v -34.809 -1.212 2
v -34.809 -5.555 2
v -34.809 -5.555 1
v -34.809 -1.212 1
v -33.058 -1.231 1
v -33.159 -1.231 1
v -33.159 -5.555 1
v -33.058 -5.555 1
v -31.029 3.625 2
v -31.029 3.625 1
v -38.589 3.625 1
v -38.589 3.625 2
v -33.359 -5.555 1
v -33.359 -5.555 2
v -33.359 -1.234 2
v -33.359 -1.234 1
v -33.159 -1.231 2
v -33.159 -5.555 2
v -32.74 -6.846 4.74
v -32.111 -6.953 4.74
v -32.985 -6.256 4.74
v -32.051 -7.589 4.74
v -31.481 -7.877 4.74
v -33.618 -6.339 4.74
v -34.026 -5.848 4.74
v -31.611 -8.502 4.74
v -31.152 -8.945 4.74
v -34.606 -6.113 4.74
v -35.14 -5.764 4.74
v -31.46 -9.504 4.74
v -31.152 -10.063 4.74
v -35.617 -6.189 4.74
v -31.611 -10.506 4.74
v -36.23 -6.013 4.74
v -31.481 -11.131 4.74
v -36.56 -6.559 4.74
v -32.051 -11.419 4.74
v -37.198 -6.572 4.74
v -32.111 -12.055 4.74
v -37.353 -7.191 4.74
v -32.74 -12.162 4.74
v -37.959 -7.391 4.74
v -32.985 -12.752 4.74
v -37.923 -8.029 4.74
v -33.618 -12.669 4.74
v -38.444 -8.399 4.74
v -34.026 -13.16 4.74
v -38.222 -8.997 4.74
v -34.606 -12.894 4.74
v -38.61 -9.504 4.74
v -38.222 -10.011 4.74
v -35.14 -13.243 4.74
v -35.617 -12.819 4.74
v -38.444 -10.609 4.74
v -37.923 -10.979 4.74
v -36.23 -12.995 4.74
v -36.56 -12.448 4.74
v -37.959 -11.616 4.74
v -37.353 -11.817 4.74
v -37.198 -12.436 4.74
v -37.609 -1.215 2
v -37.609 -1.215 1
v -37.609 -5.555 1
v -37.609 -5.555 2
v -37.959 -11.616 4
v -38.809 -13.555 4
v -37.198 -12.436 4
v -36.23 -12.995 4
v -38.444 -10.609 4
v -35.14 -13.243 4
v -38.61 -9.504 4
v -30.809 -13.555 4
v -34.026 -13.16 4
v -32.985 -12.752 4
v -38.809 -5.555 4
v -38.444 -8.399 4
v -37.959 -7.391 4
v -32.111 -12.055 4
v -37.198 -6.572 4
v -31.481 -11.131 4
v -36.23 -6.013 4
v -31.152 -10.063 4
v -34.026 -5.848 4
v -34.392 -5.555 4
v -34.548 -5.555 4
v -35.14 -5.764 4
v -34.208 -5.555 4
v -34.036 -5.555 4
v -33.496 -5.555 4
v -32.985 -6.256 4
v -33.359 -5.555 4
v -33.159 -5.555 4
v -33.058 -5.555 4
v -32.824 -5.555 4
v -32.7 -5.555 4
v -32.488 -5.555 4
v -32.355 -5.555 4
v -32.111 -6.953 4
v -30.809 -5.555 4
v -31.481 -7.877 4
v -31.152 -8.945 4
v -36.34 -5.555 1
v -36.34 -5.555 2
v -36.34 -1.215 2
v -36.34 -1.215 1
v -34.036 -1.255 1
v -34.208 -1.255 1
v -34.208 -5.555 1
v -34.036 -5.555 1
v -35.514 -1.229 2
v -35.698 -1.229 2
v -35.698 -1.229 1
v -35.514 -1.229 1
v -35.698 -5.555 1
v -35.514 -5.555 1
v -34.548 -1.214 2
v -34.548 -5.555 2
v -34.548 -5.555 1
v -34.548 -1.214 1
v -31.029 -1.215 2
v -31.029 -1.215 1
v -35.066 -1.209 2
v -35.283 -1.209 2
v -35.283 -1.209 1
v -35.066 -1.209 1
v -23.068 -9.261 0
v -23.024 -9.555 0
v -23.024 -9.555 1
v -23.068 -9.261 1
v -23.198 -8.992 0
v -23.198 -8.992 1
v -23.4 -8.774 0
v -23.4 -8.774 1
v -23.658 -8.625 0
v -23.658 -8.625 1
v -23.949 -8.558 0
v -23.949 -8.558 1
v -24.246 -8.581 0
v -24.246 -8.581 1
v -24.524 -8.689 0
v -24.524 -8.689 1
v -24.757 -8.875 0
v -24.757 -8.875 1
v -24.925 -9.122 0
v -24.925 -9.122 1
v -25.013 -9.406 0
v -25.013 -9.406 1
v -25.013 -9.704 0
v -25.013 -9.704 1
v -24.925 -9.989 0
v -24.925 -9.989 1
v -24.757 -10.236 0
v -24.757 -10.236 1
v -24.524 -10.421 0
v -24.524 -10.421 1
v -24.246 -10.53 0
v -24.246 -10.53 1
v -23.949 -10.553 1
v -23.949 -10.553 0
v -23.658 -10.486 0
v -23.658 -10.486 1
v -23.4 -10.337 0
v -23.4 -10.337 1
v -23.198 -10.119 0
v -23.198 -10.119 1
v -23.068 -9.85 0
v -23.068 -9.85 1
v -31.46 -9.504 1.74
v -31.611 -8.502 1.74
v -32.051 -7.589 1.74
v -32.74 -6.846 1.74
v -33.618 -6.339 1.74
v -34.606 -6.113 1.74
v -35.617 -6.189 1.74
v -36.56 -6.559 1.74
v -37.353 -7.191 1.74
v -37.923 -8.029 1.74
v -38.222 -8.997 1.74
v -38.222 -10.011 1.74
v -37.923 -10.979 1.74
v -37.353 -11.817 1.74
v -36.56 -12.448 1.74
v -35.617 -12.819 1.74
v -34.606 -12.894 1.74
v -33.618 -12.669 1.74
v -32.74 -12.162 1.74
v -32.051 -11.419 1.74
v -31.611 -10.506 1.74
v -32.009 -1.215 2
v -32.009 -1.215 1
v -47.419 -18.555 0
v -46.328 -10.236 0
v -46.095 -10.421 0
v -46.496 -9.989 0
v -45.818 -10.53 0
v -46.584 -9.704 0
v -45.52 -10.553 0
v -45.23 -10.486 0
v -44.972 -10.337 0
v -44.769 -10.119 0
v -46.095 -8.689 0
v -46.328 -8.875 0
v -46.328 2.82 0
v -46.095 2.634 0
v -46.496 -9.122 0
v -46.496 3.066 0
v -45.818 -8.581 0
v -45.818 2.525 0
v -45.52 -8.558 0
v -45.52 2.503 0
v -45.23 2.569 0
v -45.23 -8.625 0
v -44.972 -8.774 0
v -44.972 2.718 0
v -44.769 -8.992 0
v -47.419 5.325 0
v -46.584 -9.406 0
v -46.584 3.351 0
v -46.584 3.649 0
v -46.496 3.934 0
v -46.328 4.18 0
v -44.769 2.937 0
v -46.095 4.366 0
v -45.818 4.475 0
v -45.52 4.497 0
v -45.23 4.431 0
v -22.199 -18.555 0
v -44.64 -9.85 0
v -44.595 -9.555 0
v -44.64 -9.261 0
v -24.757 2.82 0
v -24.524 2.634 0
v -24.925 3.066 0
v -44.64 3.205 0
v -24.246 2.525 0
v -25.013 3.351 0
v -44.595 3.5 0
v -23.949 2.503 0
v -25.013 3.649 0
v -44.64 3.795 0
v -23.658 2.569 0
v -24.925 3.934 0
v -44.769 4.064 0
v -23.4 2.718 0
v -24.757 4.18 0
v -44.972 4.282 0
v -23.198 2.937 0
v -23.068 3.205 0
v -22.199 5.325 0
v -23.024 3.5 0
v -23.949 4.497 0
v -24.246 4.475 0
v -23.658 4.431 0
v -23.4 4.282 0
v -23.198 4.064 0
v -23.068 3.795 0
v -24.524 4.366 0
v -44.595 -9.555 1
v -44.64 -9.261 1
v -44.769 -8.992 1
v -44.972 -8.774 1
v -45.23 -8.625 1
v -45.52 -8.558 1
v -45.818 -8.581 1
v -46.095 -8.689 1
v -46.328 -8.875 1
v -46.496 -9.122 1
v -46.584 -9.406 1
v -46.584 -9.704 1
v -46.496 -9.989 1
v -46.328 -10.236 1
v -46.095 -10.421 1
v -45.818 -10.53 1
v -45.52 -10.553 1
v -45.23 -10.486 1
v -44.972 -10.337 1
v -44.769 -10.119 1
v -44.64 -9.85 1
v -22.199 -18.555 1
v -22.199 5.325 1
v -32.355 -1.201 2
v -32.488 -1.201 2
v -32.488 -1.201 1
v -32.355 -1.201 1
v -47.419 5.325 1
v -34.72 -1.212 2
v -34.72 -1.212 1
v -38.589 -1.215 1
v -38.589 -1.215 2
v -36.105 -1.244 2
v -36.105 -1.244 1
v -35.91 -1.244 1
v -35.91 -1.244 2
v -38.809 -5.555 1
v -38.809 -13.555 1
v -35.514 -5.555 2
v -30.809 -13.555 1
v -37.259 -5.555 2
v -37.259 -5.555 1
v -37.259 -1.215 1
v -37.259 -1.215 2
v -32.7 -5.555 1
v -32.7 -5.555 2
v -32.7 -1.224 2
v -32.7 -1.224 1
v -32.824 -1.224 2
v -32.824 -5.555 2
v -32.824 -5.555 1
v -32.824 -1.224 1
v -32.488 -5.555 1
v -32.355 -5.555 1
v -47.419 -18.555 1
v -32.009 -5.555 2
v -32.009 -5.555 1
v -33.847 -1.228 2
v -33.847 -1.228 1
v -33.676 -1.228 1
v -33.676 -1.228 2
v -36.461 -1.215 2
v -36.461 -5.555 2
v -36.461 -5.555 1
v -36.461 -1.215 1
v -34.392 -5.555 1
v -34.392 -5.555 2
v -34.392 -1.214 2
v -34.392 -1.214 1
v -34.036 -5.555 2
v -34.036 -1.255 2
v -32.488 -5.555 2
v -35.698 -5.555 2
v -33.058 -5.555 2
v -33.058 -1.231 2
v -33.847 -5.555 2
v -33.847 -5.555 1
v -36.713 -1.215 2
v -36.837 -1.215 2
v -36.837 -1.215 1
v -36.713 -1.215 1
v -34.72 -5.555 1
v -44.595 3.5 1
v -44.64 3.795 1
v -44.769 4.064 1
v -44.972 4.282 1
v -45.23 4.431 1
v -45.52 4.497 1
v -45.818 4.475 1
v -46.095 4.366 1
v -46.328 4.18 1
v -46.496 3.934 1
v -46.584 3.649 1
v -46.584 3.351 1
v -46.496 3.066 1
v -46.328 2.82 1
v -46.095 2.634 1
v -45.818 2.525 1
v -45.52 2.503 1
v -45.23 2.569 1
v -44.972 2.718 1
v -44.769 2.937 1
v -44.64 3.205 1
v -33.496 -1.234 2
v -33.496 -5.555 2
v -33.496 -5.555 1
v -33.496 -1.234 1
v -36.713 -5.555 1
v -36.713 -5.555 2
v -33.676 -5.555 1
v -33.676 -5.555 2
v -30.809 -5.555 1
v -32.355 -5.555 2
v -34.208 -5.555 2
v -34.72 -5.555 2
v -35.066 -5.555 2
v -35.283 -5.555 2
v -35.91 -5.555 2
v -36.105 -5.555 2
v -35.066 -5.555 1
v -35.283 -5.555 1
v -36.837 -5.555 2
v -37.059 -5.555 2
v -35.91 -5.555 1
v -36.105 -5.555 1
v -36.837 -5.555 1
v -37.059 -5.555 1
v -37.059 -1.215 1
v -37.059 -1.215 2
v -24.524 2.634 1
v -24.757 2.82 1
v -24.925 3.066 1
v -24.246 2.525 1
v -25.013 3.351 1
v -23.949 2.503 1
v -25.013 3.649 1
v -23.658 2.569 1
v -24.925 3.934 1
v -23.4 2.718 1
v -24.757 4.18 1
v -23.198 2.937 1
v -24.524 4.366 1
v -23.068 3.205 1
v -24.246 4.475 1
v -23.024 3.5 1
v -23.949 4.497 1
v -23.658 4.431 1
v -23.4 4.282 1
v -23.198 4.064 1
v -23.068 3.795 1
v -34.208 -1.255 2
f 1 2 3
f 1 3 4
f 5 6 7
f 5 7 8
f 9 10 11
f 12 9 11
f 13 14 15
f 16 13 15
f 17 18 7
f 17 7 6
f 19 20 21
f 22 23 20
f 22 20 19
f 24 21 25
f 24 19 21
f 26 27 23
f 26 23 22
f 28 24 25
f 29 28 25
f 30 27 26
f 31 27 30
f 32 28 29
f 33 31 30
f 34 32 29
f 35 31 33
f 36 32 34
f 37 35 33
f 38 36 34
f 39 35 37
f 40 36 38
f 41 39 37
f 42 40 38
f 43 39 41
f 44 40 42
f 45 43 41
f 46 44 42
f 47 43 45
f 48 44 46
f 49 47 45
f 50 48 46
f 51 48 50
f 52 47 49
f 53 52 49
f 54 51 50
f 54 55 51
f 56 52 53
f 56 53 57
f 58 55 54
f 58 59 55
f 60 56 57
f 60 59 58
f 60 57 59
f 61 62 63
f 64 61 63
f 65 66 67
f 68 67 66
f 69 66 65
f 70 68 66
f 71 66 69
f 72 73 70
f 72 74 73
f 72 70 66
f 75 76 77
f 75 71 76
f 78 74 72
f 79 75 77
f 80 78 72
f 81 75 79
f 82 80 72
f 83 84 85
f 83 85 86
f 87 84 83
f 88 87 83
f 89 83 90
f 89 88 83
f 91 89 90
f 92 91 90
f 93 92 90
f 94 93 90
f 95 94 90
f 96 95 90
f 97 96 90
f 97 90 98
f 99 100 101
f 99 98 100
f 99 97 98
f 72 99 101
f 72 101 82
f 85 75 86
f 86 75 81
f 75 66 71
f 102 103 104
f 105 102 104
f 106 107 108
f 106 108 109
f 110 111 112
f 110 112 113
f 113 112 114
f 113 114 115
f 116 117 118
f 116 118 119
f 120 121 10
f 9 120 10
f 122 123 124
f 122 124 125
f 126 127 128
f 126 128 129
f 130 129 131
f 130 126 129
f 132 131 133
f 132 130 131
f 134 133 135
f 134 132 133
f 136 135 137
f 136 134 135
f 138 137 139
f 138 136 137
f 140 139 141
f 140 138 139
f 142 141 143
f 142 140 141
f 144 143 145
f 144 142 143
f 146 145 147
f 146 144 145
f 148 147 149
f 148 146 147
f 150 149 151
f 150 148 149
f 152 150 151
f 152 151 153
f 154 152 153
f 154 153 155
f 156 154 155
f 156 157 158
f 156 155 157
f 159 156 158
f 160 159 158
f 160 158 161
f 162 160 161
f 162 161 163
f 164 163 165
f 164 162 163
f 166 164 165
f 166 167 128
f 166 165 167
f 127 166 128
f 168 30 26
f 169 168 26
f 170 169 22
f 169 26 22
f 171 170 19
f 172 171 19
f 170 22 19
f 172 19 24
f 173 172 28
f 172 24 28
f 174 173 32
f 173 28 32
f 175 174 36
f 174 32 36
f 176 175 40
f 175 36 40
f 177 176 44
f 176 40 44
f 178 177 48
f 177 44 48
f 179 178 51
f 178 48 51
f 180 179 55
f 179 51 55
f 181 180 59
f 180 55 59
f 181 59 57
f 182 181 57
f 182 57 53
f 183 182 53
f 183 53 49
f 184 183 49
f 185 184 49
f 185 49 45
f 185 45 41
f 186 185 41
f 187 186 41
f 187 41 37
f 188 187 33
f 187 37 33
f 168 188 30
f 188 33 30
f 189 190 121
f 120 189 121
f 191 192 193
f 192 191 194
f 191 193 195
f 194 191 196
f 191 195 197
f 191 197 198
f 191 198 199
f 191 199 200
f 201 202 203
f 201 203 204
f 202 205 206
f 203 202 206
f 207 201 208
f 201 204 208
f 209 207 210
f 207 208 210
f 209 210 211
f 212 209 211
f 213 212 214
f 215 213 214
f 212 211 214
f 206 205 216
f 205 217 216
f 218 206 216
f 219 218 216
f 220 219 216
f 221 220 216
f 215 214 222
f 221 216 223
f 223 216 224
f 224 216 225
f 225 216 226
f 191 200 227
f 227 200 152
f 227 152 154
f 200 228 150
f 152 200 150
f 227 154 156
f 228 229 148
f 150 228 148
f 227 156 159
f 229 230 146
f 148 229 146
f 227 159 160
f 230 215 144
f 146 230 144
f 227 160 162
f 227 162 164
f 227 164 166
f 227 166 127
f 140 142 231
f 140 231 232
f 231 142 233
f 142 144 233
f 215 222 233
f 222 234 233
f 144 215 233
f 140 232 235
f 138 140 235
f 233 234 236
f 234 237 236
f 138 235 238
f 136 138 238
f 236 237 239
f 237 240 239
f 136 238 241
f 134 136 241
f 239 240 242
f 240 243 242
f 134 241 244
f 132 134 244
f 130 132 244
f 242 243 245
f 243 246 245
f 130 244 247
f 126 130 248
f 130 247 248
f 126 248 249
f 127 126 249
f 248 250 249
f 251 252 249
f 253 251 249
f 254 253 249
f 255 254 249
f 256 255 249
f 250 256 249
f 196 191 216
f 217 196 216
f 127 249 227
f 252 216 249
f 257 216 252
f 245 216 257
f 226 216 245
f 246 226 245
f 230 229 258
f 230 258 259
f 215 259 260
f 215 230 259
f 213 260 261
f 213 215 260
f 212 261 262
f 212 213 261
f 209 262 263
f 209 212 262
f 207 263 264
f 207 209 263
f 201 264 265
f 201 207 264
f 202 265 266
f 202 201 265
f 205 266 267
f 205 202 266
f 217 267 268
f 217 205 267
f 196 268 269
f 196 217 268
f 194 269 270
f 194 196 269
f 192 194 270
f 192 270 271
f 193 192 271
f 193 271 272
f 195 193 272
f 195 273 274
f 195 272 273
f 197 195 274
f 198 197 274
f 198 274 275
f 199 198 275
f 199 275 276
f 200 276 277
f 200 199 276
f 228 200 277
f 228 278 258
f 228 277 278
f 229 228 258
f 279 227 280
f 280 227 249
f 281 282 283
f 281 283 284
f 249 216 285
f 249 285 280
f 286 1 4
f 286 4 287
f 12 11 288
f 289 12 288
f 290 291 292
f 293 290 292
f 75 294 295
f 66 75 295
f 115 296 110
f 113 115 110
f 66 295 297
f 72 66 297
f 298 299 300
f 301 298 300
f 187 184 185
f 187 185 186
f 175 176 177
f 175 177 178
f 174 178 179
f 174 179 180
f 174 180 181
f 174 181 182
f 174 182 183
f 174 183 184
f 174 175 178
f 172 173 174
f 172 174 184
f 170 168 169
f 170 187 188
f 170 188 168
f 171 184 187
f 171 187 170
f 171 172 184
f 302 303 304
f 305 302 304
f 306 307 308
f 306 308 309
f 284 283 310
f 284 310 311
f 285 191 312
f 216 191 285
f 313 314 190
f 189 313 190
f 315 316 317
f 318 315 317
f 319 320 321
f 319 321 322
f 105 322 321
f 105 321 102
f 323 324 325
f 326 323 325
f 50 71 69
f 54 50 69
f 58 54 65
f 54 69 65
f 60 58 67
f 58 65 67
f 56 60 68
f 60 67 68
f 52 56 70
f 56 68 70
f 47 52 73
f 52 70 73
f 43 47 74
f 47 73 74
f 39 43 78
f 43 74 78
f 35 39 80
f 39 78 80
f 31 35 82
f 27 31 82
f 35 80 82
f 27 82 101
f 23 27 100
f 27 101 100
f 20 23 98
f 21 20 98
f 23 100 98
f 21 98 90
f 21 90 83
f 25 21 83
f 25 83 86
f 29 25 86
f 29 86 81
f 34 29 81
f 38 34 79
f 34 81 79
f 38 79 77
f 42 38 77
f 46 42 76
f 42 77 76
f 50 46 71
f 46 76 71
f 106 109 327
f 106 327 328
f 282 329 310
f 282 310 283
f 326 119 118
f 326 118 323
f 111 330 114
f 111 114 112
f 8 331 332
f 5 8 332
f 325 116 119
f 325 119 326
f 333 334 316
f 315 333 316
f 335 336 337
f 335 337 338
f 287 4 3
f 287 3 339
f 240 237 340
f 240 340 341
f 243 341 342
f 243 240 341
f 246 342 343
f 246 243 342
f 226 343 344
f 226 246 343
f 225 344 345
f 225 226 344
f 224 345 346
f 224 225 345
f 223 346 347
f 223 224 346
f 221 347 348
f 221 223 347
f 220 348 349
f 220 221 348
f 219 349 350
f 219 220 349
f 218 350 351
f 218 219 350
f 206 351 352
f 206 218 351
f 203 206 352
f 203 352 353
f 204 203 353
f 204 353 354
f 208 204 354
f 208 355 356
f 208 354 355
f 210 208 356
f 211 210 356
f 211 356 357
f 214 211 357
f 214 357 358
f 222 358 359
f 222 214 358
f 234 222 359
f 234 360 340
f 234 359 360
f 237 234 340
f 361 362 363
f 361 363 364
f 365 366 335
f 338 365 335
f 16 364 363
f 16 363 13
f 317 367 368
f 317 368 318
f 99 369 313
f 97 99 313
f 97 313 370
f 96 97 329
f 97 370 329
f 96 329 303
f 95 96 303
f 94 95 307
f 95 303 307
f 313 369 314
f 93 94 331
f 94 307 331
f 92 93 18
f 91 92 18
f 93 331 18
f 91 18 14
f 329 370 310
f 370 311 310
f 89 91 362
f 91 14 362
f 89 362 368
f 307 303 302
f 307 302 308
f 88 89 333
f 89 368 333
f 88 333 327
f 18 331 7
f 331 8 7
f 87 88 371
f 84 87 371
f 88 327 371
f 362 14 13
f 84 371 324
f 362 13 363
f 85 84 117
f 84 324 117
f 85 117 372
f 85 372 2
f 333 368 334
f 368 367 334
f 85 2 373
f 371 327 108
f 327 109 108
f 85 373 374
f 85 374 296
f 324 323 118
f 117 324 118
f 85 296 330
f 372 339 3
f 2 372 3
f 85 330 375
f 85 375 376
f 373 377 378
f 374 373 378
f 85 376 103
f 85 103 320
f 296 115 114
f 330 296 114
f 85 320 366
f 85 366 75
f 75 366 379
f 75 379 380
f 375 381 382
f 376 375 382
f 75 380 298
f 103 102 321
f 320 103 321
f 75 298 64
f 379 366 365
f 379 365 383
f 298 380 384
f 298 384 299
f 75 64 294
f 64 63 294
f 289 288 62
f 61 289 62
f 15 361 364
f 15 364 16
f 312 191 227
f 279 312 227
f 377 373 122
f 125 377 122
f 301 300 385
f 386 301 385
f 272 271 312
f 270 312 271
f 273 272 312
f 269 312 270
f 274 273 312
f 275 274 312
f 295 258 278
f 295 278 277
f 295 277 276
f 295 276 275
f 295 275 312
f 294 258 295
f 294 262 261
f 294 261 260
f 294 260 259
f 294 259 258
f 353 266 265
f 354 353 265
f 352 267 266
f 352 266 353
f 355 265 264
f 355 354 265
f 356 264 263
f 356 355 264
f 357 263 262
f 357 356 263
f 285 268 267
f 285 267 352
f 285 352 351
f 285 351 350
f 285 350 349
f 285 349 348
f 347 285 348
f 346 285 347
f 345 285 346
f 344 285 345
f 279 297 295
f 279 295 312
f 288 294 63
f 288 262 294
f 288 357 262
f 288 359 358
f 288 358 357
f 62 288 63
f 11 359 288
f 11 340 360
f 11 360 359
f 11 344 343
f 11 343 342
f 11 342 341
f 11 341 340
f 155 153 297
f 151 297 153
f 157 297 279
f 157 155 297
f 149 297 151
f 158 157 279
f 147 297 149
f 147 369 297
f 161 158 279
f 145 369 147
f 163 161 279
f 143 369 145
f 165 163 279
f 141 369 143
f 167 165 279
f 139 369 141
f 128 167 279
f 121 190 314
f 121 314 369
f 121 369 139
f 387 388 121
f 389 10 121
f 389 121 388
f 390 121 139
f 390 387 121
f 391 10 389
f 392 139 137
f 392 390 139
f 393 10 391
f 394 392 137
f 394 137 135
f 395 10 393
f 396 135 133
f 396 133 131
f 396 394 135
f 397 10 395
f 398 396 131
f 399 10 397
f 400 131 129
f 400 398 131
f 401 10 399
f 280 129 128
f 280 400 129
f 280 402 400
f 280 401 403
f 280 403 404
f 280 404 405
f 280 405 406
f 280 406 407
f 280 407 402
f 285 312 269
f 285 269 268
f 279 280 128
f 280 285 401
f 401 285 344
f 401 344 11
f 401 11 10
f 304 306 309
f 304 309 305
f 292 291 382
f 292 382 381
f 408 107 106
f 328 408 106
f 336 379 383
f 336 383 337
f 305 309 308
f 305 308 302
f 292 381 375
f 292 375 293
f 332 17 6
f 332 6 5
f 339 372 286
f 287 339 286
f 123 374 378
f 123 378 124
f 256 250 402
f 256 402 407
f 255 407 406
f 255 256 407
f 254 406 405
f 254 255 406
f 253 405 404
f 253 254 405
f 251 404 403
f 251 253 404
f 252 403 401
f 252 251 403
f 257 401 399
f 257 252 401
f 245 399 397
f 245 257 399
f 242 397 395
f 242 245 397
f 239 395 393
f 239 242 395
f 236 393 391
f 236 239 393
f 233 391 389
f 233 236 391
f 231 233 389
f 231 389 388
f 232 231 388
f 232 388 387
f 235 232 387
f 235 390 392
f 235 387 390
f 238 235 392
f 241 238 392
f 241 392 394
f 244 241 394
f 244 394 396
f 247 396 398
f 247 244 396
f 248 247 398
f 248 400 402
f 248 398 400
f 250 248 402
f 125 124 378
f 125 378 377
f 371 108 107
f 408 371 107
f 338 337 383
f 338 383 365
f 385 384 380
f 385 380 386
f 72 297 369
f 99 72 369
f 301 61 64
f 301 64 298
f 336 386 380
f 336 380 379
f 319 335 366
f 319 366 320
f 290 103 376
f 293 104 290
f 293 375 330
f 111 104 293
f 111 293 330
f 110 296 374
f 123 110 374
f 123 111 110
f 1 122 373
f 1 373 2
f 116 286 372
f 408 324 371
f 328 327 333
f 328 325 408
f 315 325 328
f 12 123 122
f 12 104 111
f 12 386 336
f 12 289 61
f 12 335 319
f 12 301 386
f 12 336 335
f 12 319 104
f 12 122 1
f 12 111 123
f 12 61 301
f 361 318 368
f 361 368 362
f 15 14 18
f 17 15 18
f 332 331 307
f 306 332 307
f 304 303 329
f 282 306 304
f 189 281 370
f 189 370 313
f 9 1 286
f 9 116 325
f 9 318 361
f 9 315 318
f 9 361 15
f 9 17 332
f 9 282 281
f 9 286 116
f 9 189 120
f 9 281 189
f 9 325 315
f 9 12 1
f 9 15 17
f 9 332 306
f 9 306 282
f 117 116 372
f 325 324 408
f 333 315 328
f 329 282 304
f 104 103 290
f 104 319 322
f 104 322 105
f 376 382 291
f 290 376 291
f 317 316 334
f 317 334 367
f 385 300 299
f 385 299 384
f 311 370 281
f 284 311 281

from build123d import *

# Parameters (mm, degrees)
SKETCH1_W               = 25.22
SKETCH1_H               = 23.88
BOSS_EXTRUDE1_DEPTH     = 1
CUT_EXTRUDE1_DEPTH      = 31
CUT_EXTRUDE1_DEPTH_BACK = 15
SKETCH2_R               = 1
BOSS_EXTRUDE2_DEPTH     = 3
SKETCH5_R               = 3.75
BOSS_EXTRUDE4_DEPTH     = 0.74
SKETCH6_R               = 3.4
CUT_EXTRUDE2_DEPTH      = 3
CUT_EXTRUDE3_DEPTH      = 16
CUT_EXTRUDE3_DEPTH_BACK = 20
SKETCH7_R               = 1
BOSS_EXTRUDE5_DEPTH     = 1
SKETCH9_W               = 0.2
SKETCH9_H               = 4.34
CUT_EXTRUDE8_DEPTH      = 1
SKETCH10_W              = 0.124682
SKETCH10_H              = 4.34
CUT_EXTRUDE14_DEPTH     = 1
SKETCH13_W              = 0.120984153
SKETCH13_H              = 4.34
CUT_EXTRUDE15_DEPTH     = 1
SKETCH14_W              = 0.195011185
SKETCH14_H              = 4.311792785
CUT_EXTRUDE18_DEPTH     = 1
SKETCH15_W              = 0.183717696
SKETCH15_H              = 4.326619606
CUT_EXTRUDE21_DEPTH     = 3
SKETCH16_W              = 0.21782098
SKETCH16_H              = 4.34679289
CUT_EXTRUDE22_DEPTH     = 1
SKETCH17_W              = 0.089131755
SKETCH17_H              = 4.34294968
CUT_EXTRUDE23_DEPTH     = 3
SKETCH18_W              = 0.156151398
SKETCH18_H              = 4.341783659
CUT_EXTRUDE24_DEPTH     = 3
SKETCH19_W              = 0.171903048
SKETCH19_H              = 4.300799657
CUT_EXTRUDE26_DEPTH     = 3
SKETCH20_W              = 0.170926161
SKETCH20_H              = 4.327306154
CUT_EXTRUDE28_DEPTH     = 3
SKETCH21_W              = 0.137513245
SKETCH21_H              = 4.32177715
CUT_EXTRUDE29_DEPTH     = 3
SKETCH22_W              = 0.100998317
SKETCH22_H              = 4.324558634
CUT_EXTRUDE30_DEPTH     = 3
SKETCH23_W              = 0.123761921
SKETCH23_H              = 4.331008445
CUT_EXTRUDE31_DEPTH     = 3
SKETCH24_W              = 0.133501637
SKETCH24_H              = 4.354790364
CUT_EXTRUDE32_DEPTH     = 3


with BuildPart() as part:
    # Sketch1 → Boss-Extrude1 (new body)
    with BuildSketch(Plane.XY):
        with Locations((-34.809454486, -6.615438712)):
            Rectangle(SKETCH1_W, SKETCH1_H)
    extrude(amount=BOSS_EXTRUDE1_DEPTH)

    # Sketch2 → Cut-Extrude1 (cut, two sides: drawn at the far end of the back side and taken through both)
    with BuildSketch(Plane.XY.offset(1).offset(-CUT_EXTRUDE1_DEPTH_BACK)):
        with Locations((-24.023789981, 3.500225793)):
            Circle(SKETCH2_R)
        with Locations((-45.59511899, 3.500225793)):
            Circle(SKETCH2_R)
    extrude(amount=CUT_EXTRUDE1_DEPTH + CUT_EXTRUDE1_DEPTH_BACK, mode=Mode.SUBTRACT)

    # Sketch3 → Boss-Extrude2 (add)
    with BuildSketch(Plane.XY.offset(1)):
        Polygon((-34.809454486, -13.555438712), (-30.809454486, -13.555438712), (-30.809454486, -5.555438712), (-38.809454486, -5.555438712), (-38.809454486, -13.555438712), align=None)
    extrude(amount=BOSS_EXTRUDE2_DEPTH)

    # Sketch5 → Boss-Extrude4 (add)
    with BuildSketch(Plane.XY.offset(4)):
        with Locations(Location((-34.860129967, -9.503941157, 0), (0, 0, 180))):
            Circle(SKETCH5_R)
    extrude(amount=BOSS_EXTRUDE4_DEPTH)

    # Sketch6 → Cut-Extrude2 (cut)
    with BuildSketch(Plane.XY.offset(4.74)):
        with Locations((-34.860129967, -9.503941157)):
            Circle(SKETCH6_R)
    extrude(amount=-CUT_EXTRUDE2_DEPTH, mode=Mode.SUBTRACT)

    # Sketch7 → Cut-Extrude3 (cut, two sides: drawn at the far end of the back side and taken through both)
    with BuildSketch(Plane.XY.offset(1).offset(-CUT_EXTRUDE3_DEPTH_BACK)):
        with Locations((-24.023789981, -9.555438712)):
            Circle(SKETCH7_R)
        with Locations((-45.59511899, -9.555438712)):
            Circle(SKETCH7_R)
    extrude(amount=CUT_EXTRUDE3_DEPTH + CUT_EXTRUDE3_DEPTH_BACK, mode=Mode.SUBTRACT)

    # Sketch8 → Boss-Extrude5 (add)
    with BuildSketch(Plane.XY.offset(1)):
        Polygon((-38.589454486, 3.624561288), (-38.589454486, -1.215438712), (-37.609454486, -1.215438712), (-37.609454486, -5.555438712), (-32.009454486, -5.555438712), (-32.009454486, -1.215438712), (-31.029454486, -1.215438712), (-31.029454486, 3.624561288), (-34.809454486, 3.624561288), align=None)
    extrude(amount=BOSS_EXTRUDE5_DEPTH)

    # Sketch9 → Cut-Extrude8 (cut)
    with BuildSketch(Plane.XY.offset(1)):
        with Locations((-37.159454486, -3.385438712)):
            Rectangle(SKETCH9_W, SKETCH9_H)
    extrude(amount=CUT_EXTRUDE8_DEPTH, mode=Mode.SUBTRACT)

    # Sketch10 → Cut-Extrude14 (cut)
    with BuildSketch(Plane.XY.offset(2)):
        with Locations((-36.775157633, -3.385438712)):
            Rectangle(SKETCH10_W, SKETCH10_H)
    extrude(amount=-CUT_EXTRUDE14_DEPTH, mode=Mode.SUBTRACT)

    # Sketch13 → Cut-Extrude15 (cut)
    with BuildSketch(Plane.XY.offset(2)):
        with Locations((-36.400540983, -3.385438712)):
            Rectangle(SKETCH13_W, SKETCH13_H)
    extrude(amount=-CUT_EXTRUDE15_DEPTH, mode=Mode.SUBTRACT)

    # Sketch14 → Cut-Extrude18 (cut)
    with BuildSketch(Plane.XY.offset(1)):
        with Locations((-36.007757653, -3.39954232)):
            Rectangle(SKETCH14_W, SKETCH14_H)
    extrude(amount=CUT_EXTRUDE18_DEPTH, mode=Mode.SUBTRACT)

    # Sketch15 → Cut-Extrude21 (cut)
    with BuildSketch(Plane.XY.offset(4)):
        with Locations((-35.606147547, -3.392128909)):
            Rectangle(SKETCH15_W, SKETCH15_H)
    extrude(amount=-CUT_EXTRUDE21_DEPTH, mode=Mode.SUBTRACT)

    # Sketch16 → Cut-Extrude22 (cut)
    with BuildSketch(Plane.XY.offset(2)):
        with Locations((-35.174485224, -3.382042267)):
            Rectangle(SKETCH16_W, SKETCH16_H)
    extrude(amount=-CUT_EXTRUDE22_DEPTH, mode=Mode.SUBTRACT)

    # Sketch17 → Cut-Extrude23 (cut)
    with BuildSketch(Plane.XY.offset(4)):
        with Locations((-34.764888609, -3.383963872)):
            Rectangle(SKETCH17_W, SKETCH17_H)
    extrude(amount=-CUT_EXTRUDE23_DEPTH, mode=Mode.SUBTRACT)

    # Sketch18 → Cut-Extrude24 (cut)
    with BuildSketch(Plane.XY.offset(4)):
        with Locations((-34.470187586, -3.384546883)):
            Rectangle(SKETCH18_W, SKETCH18_H)
    extrude(amount=-CUT_EXTRUDE24_DEPTH, mode=Mode.SUBTRACT)

    # Sketch19 → Cut-Extrude26 (cut)
    with BuildSketch(Plane.XY.offset(1)):
        with Locations((-34.122346996, -3.405038884)):
            Rectangle(SKETCH19_W, SKETCH19_H)
    extrude(amount=CUT_EXTRUDE26_DEPTH, mode=Mode.SUBTRACT)

    # Sketch20 → Cut-Extrude28 (cut)
    with BuildSketch(Plane.XY.offset(1)):
        with Locations((-33.761764477, -3.391785635)):
            Rectangle(SKETCH20_W, SKETCH20_H)
    extrude(amount=CUT_EXTRUDE28_DEPTH, mode=Mode.SUBTRACT)

    # Sketch21 → Cut-Extrude29 (cut)
    with BuildSketch(Plane.XY.offset(4)):
        with Locations((-33.427485819, -3.394550137)):
            Rectangle(SKETCH21_W, SKETCH21_H)
    extrude(amount=-CUT_EXTRUDE29_DEPTH, mode=Mode.SUBTRACT)

    # Sketch22 → Cut-Extrude30 (cut)
    with BuildSketch(Plane.XY.offset(4)):
        with Locations((-33.108230038, -3.393159395)):
            Rectangle(SKETCH22_W, SKETCH22_H)
    extrude(amount=-CUT_EXTRUDE30_DEPTH, mode=Mode.SUBTRACT)

    # Sketch23 → Cut-Extrude31 (cut)
    with BuildSketch(Plane.XY.offset(4)):
        with Locations((-32.761705251, -3.389934489)):
            Rectangle(SKETCH23_W, SKETCH23_H)
    extrude(amount=-CUT_EXTRUDE31_DEPTH, mode=Mode.SUBTRACT)

    # Sketch24 → Cut-Extrude32 (cut)
    with BuildSketch(Plane.XY.offset(4)):
        with Locations((-32.421390207, -3.37804353)):
            Rectangle(SKETCH24_W, SKETCH24_H)
    extrude(amount=-CUT_EXTRUDE32_DEPTH, mode=Mode.SUBTRACT)


solid = part.part
